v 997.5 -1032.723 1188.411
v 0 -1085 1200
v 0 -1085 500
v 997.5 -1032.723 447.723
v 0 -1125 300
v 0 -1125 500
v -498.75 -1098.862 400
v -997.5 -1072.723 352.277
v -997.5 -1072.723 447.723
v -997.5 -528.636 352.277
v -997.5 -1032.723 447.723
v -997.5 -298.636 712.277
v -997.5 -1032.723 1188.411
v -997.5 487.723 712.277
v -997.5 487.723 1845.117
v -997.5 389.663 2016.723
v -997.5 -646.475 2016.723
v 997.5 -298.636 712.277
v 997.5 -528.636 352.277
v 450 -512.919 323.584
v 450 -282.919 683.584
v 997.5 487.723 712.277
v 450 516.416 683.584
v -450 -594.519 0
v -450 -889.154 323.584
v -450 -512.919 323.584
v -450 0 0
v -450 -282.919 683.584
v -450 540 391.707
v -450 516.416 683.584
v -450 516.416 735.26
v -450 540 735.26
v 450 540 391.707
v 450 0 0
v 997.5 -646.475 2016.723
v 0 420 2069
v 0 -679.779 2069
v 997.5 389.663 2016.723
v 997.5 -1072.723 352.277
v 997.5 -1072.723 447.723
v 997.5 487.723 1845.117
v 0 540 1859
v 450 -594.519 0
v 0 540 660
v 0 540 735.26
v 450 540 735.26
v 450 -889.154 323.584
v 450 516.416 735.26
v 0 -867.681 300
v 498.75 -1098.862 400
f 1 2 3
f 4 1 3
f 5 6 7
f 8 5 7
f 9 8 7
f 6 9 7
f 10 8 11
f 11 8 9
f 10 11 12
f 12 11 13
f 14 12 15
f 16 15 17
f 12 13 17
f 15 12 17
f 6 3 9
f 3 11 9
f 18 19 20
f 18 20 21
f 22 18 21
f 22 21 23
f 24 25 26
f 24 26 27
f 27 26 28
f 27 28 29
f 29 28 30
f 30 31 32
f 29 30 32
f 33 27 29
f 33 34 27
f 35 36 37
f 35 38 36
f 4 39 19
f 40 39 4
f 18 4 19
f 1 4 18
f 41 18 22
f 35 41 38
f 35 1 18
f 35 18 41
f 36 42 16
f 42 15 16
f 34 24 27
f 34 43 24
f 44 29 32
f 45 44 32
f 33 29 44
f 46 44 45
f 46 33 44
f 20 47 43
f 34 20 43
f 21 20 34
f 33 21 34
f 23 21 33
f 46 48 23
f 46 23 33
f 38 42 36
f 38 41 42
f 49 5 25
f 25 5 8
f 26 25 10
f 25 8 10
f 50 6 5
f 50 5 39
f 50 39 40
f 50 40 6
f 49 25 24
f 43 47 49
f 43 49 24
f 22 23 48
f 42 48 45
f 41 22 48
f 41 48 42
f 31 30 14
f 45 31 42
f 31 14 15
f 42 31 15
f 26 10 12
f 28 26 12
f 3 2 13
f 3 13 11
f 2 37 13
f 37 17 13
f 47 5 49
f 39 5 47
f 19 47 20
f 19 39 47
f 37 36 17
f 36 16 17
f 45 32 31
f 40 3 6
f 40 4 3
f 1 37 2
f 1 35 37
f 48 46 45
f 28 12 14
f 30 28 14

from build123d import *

# Parameters (mm, degrees)
F1_DEPTH = 997.5
F1_TAPER = 3
F3_DEPTH = 450


# Not quite as in the source:
# - a feature of the source that left no trace in its solid (it failed there, or was rolled back) is left out


with BuildPart() as f1:
    # F0 (on Right) → F1 (new body, symmetric)
    with BuildSketch(Plane.YZ):
        Polygon((-270, 660), (540, 660), (540, 1859), (420, 2069), (-679.7786450633, 2069), (-1085, 1200), (-1085, 500), (-1125, 500), (-1125, 300), (-500, 300), align=None)
    extrude(amount=F1_DEPTH, both=True, taper=F1_TAPER)

    # F2 (on Right) → F3 (join, symmetric)
    with BuildSketch(Plane.YZ):
        Polygon((540, 391.706943512), (540, 660), (540, 735.2597117424), (-594.5192575455, 735.2597117424), (-956.7571282387, 397.828578949), (-594.5192575455, 0), (0, 0), align=None)
    extrude(amount=F3_DEPTH, both=True)


solid = f1.part
